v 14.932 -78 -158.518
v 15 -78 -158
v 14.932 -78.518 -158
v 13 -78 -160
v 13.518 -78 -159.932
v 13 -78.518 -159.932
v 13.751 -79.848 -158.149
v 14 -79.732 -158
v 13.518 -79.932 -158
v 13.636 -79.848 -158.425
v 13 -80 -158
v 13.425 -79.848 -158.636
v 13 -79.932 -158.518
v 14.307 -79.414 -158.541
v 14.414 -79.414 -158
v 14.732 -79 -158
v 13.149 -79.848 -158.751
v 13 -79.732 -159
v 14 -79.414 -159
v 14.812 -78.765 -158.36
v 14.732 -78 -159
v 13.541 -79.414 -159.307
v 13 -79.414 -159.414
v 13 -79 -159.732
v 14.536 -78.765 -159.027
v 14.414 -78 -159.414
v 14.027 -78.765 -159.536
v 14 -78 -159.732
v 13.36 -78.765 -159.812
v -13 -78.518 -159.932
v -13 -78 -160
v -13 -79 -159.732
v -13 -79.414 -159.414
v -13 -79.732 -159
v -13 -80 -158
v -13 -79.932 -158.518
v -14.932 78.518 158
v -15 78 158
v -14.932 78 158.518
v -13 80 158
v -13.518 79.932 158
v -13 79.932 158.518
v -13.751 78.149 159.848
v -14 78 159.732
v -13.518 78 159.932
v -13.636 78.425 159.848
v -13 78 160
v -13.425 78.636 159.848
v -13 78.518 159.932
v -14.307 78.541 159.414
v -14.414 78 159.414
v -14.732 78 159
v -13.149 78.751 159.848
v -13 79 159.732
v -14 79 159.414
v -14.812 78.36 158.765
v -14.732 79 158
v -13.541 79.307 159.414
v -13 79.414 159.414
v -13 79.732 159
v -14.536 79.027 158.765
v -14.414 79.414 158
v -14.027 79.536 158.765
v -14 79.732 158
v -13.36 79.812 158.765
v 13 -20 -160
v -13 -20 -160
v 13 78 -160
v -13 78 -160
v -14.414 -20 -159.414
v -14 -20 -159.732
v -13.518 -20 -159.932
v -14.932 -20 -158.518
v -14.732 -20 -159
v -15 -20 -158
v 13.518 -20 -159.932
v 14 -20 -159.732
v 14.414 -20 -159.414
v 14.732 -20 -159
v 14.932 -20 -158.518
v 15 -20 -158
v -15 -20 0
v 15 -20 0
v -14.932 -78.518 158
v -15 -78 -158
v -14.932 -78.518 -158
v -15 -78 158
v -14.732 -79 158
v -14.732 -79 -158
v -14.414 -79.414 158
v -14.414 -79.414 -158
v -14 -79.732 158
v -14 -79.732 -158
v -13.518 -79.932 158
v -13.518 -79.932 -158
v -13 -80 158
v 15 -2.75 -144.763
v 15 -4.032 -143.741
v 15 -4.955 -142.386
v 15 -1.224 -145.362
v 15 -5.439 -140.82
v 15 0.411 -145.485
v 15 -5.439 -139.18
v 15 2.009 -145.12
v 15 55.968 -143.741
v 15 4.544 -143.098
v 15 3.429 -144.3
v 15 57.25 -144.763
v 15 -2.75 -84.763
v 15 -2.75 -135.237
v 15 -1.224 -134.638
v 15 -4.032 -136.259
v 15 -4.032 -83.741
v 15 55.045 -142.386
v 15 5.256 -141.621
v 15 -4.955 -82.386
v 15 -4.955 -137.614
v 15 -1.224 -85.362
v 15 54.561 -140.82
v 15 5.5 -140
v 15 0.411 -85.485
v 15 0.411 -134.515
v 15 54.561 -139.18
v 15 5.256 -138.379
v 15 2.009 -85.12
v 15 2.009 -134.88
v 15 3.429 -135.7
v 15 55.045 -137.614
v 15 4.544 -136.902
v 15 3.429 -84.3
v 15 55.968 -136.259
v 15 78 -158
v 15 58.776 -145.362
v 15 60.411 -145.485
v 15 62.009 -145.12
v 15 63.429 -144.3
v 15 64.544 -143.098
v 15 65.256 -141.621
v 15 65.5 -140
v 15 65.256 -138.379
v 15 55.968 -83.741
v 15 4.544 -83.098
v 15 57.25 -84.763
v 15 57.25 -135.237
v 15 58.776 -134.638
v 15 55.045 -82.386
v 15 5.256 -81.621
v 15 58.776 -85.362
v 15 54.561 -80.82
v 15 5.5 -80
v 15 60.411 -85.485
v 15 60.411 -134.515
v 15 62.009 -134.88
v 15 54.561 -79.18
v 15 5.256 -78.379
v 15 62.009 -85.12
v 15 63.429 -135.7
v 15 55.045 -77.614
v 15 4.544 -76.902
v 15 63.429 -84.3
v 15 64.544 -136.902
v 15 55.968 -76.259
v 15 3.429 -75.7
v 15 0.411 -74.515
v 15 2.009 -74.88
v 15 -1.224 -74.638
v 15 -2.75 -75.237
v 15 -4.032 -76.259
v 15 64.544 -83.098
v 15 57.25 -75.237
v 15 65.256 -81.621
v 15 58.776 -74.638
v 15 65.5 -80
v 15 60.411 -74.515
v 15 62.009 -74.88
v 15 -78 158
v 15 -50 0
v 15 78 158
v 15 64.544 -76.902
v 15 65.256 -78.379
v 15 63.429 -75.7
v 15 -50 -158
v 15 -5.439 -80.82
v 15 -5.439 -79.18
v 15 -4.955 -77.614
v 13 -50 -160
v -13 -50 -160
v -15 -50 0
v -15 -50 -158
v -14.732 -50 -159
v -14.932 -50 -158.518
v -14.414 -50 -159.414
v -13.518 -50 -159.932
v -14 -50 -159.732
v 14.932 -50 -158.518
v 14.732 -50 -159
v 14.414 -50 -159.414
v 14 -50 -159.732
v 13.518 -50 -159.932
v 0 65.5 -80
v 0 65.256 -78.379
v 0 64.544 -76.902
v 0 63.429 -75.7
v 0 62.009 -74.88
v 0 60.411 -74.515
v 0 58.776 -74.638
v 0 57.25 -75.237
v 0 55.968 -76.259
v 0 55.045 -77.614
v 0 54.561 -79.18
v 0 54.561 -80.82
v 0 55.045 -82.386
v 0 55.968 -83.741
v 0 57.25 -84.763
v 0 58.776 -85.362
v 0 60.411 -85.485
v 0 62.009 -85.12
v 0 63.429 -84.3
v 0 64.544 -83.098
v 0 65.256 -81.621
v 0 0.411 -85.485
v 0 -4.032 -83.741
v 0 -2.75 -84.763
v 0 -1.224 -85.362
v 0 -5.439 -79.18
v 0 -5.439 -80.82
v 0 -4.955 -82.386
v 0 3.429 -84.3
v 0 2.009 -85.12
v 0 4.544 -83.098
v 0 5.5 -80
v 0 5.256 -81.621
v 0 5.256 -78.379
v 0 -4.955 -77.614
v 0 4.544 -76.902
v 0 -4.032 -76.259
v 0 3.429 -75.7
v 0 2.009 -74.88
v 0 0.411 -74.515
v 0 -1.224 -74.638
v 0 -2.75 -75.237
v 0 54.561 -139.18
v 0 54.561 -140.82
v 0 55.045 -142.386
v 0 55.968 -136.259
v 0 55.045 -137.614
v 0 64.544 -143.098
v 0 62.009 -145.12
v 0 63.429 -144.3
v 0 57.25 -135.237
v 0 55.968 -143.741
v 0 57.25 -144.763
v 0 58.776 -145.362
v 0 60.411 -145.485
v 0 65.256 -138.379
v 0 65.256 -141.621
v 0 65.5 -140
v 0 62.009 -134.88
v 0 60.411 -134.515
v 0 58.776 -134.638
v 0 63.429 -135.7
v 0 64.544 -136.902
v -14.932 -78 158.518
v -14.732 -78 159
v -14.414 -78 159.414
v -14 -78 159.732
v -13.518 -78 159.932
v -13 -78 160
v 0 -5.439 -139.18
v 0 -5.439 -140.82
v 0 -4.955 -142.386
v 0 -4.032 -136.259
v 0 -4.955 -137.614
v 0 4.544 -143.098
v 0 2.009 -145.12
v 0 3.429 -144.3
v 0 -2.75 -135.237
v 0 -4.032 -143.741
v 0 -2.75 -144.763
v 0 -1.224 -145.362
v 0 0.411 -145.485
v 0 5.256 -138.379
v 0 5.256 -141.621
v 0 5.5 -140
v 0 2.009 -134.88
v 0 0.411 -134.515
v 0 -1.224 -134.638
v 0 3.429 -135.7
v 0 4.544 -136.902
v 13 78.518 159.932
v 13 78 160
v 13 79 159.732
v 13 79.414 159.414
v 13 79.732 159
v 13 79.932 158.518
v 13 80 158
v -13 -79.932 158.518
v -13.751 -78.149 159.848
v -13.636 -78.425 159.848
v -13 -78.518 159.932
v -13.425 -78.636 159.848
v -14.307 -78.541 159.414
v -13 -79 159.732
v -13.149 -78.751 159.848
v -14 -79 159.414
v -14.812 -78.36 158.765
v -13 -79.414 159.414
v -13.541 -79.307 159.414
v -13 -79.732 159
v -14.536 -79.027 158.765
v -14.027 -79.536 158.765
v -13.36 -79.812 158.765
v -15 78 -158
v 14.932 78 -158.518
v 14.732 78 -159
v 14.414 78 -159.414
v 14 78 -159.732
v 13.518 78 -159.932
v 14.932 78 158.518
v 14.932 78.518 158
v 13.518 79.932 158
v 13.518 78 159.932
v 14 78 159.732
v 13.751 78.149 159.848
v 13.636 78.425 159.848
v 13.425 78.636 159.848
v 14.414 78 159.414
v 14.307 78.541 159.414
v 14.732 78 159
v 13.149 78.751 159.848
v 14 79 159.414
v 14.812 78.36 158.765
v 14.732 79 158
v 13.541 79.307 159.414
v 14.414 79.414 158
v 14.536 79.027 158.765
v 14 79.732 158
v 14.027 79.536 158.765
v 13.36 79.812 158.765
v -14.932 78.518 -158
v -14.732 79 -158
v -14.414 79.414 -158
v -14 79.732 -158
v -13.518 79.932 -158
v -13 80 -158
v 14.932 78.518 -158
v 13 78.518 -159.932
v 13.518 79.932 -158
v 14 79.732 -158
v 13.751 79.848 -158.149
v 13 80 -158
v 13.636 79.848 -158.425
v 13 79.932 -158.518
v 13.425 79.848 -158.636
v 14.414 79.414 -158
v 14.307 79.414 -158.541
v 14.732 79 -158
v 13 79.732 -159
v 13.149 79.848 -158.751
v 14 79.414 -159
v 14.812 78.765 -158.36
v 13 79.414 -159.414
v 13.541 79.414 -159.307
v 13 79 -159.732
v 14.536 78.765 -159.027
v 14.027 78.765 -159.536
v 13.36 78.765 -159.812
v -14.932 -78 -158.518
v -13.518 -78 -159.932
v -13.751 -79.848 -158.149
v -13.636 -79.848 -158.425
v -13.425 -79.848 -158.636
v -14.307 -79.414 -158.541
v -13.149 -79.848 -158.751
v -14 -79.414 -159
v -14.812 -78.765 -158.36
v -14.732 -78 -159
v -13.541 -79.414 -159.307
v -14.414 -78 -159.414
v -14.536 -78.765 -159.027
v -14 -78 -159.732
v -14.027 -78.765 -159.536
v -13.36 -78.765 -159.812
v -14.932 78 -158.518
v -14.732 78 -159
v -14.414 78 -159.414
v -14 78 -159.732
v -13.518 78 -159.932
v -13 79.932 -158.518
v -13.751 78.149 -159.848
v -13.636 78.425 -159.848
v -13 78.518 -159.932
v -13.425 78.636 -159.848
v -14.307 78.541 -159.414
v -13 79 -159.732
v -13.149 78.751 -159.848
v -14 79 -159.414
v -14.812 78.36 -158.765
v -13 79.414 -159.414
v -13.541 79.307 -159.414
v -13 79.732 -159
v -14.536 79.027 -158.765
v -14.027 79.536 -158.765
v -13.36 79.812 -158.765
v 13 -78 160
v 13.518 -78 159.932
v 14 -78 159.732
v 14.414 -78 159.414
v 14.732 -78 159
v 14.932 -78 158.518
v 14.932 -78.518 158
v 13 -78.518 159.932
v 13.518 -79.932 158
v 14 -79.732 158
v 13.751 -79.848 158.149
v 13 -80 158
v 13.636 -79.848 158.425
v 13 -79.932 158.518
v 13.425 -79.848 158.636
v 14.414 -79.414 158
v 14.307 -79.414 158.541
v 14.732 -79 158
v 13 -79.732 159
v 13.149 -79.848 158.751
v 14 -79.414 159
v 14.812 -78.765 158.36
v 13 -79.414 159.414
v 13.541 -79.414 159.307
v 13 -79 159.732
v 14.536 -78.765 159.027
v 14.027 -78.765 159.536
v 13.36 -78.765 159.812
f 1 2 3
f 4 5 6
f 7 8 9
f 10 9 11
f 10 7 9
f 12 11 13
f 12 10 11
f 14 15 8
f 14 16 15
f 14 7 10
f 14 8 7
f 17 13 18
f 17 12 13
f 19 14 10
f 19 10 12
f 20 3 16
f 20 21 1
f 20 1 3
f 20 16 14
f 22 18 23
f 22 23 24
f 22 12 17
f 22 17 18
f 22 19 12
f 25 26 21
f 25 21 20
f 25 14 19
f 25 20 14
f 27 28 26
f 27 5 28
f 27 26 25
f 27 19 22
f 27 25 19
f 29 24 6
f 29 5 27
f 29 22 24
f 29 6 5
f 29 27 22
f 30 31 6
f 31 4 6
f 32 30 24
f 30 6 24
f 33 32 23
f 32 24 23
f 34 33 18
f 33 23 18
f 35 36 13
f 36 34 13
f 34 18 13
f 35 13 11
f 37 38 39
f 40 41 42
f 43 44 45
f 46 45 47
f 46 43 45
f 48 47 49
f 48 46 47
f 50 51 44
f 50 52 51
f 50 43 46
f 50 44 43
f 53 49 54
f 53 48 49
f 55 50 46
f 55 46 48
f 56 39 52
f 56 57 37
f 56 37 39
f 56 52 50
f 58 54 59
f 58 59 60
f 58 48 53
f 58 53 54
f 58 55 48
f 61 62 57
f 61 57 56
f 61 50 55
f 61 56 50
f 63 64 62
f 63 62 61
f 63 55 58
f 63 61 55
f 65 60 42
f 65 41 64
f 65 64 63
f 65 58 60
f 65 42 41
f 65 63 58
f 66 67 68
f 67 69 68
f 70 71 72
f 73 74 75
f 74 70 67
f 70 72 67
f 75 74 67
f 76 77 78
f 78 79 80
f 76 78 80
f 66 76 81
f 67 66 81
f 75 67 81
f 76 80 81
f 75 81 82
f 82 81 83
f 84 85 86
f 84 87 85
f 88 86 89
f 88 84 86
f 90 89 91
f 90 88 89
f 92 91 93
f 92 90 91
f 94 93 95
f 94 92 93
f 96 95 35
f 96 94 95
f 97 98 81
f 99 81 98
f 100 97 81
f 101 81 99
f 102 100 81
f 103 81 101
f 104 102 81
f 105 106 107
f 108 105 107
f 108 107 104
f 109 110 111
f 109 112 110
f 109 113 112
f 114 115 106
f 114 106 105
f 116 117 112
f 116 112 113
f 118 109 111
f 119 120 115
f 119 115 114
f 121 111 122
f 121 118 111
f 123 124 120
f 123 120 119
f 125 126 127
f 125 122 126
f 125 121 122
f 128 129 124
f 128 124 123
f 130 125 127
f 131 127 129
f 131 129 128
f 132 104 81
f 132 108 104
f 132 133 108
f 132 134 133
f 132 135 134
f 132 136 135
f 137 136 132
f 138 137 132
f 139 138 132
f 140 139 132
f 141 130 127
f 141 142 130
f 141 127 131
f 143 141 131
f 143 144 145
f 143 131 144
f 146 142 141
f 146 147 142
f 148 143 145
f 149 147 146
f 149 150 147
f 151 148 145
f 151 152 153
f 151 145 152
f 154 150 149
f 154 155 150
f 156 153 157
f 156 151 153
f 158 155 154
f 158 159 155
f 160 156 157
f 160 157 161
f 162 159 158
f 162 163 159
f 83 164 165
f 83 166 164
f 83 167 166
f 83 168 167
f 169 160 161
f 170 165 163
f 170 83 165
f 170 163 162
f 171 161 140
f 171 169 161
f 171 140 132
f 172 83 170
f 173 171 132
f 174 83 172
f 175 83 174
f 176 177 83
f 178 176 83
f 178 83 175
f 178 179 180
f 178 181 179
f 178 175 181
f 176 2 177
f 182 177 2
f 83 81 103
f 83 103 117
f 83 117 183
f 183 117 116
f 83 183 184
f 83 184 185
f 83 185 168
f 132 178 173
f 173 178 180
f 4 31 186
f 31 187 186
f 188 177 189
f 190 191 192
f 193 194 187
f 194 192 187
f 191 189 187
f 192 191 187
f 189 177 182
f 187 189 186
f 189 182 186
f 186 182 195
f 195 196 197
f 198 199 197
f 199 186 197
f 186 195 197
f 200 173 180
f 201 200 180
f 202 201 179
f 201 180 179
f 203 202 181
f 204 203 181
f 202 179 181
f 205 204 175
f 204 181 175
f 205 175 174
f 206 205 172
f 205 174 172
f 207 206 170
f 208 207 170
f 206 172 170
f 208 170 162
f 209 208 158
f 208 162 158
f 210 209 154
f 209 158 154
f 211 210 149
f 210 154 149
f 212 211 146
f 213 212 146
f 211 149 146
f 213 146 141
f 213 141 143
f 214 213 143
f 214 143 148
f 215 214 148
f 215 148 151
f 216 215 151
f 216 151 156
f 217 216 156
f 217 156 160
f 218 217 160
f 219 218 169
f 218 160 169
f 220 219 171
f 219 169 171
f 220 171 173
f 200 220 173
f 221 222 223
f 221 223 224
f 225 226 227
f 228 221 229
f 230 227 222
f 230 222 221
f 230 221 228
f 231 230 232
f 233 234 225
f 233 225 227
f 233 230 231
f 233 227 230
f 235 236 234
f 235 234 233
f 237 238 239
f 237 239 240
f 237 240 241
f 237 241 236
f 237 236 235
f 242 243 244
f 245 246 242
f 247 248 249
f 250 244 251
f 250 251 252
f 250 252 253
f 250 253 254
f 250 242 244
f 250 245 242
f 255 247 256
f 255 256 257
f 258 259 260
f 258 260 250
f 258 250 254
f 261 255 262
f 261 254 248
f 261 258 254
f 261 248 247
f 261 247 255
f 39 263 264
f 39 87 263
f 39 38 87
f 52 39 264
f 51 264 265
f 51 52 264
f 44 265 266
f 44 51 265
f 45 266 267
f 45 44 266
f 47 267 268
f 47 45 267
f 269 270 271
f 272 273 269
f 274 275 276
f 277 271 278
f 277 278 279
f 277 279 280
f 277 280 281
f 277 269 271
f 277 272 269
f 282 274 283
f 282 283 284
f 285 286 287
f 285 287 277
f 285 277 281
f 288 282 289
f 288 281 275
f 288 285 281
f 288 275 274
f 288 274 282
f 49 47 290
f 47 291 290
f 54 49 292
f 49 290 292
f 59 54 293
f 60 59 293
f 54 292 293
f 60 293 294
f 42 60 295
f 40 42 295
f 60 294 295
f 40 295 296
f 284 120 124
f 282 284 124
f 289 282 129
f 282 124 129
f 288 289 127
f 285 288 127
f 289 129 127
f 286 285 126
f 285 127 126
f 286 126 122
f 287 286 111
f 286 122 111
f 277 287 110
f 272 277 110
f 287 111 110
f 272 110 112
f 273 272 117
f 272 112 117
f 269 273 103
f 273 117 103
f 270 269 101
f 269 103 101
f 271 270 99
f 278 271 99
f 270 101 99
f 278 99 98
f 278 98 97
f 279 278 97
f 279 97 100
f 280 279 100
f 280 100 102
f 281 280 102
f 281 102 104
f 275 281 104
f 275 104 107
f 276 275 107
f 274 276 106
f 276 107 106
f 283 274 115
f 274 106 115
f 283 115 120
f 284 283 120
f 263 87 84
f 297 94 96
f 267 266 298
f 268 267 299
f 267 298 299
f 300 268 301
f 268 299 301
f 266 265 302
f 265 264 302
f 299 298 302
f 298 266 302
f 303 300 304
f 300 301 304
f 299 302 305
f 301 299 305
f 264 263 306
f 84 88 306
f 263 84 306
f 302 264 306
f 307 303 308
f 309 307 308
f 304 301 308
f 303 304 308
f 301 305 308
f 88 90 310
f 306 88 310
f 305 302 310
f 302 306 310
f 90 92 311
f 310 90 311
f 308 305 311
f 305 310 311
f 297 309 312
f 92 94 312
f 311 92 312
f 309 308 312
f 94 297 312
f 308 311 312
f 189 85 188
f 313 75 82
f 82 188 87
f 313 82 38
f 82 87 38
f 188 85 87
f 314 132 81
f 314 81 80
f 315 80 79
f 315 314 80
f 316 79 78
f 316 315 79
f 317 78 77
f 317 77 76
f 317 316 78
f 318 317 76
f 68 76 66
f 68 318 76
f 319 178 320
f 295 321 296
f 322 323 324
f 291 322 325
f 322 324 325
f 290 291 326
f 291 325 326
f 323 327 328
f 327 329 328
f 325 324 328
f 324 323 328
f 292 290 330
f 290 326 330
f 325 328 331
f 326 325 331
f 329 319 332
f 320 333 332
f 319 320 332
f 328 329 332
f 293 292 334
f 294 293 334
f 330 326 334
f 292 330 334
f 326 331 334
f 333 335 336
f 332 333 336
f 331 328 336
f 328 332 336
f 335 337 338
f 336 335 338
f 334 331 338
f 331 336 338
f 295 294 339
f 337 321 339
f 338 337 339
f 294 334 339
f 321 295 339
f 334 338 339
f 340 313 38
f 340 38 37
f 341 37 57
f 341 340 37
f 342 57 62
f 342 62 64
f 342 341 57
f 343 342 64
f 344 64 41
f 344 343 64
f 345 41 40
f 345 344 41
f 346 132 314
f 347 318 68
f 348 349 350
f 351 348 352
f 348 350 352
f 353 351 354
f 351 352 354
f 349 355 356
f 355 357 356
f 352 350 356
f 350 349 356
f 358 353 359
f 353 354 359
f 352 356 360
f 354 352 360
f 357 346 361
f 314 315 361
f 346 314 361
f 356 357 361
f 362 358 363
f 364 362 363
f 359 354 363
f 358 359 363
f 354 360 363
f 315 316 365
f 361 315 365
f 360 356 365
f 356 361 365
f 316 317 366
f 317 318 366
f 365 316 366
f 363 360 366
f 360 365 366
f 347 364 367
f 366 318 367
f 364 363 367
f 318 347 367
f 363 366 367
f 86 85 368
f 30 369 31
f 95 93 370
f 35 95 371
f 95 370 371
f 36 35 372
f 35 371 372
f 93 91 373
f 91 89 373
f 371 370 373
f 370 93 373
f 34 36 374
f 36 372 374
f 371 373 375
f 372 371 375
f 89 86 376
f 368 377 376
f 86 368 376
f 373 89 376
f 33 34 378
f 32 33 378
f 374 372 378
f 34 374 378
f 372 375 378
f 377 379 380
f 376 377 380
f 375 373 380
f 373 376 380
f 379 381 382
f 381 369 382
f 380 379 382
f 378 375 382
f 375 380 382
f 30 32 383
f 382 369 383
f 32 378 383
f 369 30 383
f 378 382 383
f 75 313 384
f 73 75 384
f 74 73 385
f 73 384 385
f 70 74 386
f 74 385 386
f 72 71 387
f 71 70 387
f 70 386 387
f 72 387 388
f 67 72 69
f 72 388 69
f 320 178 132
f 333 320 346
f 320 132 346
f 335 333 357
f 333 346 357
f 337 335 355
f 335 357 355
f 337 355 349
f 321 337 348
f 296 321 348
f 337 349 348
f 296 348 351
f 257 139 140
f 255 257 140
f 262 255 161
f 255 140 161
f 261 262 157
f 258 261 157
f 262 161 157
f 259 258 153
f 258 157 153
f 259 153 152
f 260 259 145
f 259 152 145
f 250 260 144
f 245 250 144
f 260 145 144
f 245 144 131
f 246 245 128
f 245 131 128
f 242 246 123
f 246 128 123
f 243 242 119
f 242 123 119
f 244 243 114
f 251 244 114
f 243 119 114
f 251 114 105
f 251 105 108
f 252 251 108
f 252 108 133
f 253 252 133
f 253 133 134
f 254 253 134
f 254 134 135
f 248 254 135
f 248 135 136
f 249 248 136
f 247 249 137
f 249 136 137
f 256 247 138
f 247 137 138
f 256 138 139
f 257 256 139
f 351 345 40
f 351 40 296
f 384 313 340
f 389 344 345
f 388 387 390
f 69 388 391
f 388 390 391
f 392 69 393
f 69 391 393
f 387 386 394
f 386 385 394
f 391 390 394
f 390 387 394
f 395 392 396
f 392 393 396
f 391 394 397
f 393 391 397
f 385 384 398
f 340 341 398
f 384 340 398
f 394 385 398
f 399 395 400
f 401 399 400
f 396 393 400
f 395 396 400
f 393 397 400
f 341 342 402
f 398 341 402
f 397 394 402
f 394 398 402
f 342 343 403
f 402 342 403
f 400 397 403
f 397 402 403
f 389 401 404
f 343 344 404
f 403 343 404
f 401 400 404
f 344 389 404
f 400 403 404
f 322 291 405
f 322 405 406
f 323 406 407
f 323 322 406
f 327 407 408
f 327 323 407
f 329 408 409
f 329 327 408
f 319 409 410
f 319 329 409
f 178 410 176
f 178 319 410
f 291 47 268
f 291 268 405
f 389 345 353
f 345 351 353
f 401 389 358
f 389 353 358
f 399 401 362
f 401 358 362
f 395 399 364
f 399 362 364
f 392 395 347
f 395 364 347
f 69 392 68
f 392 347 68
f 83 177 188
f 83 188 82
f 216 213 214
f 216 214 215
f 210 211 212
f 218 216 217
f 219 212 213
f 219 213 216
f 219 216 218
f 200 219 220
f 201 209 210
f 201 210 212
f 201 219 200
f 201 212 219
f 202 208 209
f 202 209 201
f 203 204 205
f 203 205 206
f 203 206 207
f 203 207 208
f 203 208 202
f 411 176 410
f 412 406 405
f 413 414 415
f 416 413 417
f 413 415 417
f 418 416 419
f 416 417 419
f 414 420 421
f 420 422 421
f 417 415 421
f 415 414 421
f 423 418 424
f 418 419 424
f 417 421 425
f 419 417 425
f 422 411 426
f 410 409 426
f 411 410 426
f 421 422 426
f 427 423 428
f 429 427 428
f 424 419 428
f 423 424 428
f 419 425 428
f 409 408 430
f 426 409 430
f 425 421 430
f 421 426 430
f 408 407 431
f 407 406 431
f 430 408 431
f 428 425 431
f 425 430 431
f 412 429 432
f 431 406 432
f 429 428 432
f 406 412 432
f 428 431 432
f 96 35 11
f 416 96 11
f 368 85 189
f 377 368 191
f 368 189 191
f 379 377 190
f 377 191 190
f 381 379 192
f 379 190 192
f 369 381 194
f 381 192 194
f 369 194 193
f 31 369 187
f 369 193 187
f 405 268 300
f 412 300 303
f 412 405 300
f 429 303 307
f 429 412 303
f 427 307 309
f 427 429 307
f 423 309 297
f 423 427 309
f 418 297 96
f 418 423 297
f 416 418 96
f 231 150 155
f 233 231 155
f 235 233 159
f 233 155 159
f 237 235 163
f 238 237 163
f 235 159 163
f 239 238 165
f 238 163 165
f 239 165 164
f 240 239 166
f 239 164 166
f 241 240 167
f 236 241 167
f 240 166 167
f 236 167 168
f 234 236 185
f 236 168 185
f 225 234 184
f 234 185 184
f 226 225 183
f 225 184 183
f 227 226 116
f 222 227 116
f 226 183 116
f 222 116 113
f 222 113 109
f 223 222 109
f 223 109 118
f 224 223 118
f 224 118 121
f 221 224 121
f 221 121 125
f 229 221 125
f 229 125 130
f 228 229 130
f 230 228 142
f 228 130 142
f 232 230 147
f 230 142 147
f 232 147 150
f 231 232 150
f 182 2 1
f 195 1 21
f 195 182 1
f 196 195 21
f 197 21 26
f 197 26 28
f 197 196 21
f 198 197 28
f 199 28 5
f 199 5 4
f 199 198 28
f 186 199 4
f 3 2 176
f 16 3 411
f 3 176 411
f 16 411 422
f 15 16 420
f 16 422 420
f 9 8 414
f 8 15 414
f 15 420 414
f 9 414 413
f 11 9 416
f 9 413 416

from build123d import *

# Parameters (mm, degrees)
F1_W     = 30
F1_H     = 160
F2_DEPTH = 160
F3_R     = 2
F4_W     = 30
F4_H     = 158
F4_H_2   = 2
F5_DEPTH = 30.001
F4_R     = 5.5
F6_DEPTH = 15


with BuildPart() as f2:
    # F1 (on face) → F2 (new body, symmetric)
    with BuildSketch(Plane.XY):
        Rectangle(F1_W, F1_H)
    extrude(amount=F2_DEPTH, both=True)

    # F3
    f3_edges = [f2.edges().sort_by_distance(p)[0] for p in [
        (15, 0, -160),
        (15, 80, 0),
        (15, 0, 160),
        (15, -80, 0),
        (-15, 80, 0),
        (-15, 0, -160),
        (-15, -80, 0),
        (-15, 0, 160),
        (0, 80, -160),
        (0, -80, -160),
        (0, 80, 160),
        (0, -80, 160),
    ]]
    fillet(f3_edges, radius=F3_R)

    # F4 (on face) → F5 (cut, through all)
    with BuildSketch(Plane.YZ.offset(15)):
        with Locations((-35, -79)):
            Rectangle(F4_W, F4_H)
        with Locations((-35, -159)):
            Rectangle(F4_W, F4_H_2)
    extrude(amount=-F5_DEPTH, mode=Mode.SUBTRACT)

    # F4 (on face) → F6 (cut)
    with BuildSketch(Plane.YZ.offset(15)):
        with Locations((60, -140)):
            Circle(F4_R)
        with Locations((0, -140)):
            Circle(F4_R)
        with Locations((0, -80)):
            Circle(F4_R)
        with Locations((60, -80)):
            Circle(F4_R)
    extrude(amount=-F6_DEPTH, mode=Mode.SUBTRACT)


solid = f2.part
